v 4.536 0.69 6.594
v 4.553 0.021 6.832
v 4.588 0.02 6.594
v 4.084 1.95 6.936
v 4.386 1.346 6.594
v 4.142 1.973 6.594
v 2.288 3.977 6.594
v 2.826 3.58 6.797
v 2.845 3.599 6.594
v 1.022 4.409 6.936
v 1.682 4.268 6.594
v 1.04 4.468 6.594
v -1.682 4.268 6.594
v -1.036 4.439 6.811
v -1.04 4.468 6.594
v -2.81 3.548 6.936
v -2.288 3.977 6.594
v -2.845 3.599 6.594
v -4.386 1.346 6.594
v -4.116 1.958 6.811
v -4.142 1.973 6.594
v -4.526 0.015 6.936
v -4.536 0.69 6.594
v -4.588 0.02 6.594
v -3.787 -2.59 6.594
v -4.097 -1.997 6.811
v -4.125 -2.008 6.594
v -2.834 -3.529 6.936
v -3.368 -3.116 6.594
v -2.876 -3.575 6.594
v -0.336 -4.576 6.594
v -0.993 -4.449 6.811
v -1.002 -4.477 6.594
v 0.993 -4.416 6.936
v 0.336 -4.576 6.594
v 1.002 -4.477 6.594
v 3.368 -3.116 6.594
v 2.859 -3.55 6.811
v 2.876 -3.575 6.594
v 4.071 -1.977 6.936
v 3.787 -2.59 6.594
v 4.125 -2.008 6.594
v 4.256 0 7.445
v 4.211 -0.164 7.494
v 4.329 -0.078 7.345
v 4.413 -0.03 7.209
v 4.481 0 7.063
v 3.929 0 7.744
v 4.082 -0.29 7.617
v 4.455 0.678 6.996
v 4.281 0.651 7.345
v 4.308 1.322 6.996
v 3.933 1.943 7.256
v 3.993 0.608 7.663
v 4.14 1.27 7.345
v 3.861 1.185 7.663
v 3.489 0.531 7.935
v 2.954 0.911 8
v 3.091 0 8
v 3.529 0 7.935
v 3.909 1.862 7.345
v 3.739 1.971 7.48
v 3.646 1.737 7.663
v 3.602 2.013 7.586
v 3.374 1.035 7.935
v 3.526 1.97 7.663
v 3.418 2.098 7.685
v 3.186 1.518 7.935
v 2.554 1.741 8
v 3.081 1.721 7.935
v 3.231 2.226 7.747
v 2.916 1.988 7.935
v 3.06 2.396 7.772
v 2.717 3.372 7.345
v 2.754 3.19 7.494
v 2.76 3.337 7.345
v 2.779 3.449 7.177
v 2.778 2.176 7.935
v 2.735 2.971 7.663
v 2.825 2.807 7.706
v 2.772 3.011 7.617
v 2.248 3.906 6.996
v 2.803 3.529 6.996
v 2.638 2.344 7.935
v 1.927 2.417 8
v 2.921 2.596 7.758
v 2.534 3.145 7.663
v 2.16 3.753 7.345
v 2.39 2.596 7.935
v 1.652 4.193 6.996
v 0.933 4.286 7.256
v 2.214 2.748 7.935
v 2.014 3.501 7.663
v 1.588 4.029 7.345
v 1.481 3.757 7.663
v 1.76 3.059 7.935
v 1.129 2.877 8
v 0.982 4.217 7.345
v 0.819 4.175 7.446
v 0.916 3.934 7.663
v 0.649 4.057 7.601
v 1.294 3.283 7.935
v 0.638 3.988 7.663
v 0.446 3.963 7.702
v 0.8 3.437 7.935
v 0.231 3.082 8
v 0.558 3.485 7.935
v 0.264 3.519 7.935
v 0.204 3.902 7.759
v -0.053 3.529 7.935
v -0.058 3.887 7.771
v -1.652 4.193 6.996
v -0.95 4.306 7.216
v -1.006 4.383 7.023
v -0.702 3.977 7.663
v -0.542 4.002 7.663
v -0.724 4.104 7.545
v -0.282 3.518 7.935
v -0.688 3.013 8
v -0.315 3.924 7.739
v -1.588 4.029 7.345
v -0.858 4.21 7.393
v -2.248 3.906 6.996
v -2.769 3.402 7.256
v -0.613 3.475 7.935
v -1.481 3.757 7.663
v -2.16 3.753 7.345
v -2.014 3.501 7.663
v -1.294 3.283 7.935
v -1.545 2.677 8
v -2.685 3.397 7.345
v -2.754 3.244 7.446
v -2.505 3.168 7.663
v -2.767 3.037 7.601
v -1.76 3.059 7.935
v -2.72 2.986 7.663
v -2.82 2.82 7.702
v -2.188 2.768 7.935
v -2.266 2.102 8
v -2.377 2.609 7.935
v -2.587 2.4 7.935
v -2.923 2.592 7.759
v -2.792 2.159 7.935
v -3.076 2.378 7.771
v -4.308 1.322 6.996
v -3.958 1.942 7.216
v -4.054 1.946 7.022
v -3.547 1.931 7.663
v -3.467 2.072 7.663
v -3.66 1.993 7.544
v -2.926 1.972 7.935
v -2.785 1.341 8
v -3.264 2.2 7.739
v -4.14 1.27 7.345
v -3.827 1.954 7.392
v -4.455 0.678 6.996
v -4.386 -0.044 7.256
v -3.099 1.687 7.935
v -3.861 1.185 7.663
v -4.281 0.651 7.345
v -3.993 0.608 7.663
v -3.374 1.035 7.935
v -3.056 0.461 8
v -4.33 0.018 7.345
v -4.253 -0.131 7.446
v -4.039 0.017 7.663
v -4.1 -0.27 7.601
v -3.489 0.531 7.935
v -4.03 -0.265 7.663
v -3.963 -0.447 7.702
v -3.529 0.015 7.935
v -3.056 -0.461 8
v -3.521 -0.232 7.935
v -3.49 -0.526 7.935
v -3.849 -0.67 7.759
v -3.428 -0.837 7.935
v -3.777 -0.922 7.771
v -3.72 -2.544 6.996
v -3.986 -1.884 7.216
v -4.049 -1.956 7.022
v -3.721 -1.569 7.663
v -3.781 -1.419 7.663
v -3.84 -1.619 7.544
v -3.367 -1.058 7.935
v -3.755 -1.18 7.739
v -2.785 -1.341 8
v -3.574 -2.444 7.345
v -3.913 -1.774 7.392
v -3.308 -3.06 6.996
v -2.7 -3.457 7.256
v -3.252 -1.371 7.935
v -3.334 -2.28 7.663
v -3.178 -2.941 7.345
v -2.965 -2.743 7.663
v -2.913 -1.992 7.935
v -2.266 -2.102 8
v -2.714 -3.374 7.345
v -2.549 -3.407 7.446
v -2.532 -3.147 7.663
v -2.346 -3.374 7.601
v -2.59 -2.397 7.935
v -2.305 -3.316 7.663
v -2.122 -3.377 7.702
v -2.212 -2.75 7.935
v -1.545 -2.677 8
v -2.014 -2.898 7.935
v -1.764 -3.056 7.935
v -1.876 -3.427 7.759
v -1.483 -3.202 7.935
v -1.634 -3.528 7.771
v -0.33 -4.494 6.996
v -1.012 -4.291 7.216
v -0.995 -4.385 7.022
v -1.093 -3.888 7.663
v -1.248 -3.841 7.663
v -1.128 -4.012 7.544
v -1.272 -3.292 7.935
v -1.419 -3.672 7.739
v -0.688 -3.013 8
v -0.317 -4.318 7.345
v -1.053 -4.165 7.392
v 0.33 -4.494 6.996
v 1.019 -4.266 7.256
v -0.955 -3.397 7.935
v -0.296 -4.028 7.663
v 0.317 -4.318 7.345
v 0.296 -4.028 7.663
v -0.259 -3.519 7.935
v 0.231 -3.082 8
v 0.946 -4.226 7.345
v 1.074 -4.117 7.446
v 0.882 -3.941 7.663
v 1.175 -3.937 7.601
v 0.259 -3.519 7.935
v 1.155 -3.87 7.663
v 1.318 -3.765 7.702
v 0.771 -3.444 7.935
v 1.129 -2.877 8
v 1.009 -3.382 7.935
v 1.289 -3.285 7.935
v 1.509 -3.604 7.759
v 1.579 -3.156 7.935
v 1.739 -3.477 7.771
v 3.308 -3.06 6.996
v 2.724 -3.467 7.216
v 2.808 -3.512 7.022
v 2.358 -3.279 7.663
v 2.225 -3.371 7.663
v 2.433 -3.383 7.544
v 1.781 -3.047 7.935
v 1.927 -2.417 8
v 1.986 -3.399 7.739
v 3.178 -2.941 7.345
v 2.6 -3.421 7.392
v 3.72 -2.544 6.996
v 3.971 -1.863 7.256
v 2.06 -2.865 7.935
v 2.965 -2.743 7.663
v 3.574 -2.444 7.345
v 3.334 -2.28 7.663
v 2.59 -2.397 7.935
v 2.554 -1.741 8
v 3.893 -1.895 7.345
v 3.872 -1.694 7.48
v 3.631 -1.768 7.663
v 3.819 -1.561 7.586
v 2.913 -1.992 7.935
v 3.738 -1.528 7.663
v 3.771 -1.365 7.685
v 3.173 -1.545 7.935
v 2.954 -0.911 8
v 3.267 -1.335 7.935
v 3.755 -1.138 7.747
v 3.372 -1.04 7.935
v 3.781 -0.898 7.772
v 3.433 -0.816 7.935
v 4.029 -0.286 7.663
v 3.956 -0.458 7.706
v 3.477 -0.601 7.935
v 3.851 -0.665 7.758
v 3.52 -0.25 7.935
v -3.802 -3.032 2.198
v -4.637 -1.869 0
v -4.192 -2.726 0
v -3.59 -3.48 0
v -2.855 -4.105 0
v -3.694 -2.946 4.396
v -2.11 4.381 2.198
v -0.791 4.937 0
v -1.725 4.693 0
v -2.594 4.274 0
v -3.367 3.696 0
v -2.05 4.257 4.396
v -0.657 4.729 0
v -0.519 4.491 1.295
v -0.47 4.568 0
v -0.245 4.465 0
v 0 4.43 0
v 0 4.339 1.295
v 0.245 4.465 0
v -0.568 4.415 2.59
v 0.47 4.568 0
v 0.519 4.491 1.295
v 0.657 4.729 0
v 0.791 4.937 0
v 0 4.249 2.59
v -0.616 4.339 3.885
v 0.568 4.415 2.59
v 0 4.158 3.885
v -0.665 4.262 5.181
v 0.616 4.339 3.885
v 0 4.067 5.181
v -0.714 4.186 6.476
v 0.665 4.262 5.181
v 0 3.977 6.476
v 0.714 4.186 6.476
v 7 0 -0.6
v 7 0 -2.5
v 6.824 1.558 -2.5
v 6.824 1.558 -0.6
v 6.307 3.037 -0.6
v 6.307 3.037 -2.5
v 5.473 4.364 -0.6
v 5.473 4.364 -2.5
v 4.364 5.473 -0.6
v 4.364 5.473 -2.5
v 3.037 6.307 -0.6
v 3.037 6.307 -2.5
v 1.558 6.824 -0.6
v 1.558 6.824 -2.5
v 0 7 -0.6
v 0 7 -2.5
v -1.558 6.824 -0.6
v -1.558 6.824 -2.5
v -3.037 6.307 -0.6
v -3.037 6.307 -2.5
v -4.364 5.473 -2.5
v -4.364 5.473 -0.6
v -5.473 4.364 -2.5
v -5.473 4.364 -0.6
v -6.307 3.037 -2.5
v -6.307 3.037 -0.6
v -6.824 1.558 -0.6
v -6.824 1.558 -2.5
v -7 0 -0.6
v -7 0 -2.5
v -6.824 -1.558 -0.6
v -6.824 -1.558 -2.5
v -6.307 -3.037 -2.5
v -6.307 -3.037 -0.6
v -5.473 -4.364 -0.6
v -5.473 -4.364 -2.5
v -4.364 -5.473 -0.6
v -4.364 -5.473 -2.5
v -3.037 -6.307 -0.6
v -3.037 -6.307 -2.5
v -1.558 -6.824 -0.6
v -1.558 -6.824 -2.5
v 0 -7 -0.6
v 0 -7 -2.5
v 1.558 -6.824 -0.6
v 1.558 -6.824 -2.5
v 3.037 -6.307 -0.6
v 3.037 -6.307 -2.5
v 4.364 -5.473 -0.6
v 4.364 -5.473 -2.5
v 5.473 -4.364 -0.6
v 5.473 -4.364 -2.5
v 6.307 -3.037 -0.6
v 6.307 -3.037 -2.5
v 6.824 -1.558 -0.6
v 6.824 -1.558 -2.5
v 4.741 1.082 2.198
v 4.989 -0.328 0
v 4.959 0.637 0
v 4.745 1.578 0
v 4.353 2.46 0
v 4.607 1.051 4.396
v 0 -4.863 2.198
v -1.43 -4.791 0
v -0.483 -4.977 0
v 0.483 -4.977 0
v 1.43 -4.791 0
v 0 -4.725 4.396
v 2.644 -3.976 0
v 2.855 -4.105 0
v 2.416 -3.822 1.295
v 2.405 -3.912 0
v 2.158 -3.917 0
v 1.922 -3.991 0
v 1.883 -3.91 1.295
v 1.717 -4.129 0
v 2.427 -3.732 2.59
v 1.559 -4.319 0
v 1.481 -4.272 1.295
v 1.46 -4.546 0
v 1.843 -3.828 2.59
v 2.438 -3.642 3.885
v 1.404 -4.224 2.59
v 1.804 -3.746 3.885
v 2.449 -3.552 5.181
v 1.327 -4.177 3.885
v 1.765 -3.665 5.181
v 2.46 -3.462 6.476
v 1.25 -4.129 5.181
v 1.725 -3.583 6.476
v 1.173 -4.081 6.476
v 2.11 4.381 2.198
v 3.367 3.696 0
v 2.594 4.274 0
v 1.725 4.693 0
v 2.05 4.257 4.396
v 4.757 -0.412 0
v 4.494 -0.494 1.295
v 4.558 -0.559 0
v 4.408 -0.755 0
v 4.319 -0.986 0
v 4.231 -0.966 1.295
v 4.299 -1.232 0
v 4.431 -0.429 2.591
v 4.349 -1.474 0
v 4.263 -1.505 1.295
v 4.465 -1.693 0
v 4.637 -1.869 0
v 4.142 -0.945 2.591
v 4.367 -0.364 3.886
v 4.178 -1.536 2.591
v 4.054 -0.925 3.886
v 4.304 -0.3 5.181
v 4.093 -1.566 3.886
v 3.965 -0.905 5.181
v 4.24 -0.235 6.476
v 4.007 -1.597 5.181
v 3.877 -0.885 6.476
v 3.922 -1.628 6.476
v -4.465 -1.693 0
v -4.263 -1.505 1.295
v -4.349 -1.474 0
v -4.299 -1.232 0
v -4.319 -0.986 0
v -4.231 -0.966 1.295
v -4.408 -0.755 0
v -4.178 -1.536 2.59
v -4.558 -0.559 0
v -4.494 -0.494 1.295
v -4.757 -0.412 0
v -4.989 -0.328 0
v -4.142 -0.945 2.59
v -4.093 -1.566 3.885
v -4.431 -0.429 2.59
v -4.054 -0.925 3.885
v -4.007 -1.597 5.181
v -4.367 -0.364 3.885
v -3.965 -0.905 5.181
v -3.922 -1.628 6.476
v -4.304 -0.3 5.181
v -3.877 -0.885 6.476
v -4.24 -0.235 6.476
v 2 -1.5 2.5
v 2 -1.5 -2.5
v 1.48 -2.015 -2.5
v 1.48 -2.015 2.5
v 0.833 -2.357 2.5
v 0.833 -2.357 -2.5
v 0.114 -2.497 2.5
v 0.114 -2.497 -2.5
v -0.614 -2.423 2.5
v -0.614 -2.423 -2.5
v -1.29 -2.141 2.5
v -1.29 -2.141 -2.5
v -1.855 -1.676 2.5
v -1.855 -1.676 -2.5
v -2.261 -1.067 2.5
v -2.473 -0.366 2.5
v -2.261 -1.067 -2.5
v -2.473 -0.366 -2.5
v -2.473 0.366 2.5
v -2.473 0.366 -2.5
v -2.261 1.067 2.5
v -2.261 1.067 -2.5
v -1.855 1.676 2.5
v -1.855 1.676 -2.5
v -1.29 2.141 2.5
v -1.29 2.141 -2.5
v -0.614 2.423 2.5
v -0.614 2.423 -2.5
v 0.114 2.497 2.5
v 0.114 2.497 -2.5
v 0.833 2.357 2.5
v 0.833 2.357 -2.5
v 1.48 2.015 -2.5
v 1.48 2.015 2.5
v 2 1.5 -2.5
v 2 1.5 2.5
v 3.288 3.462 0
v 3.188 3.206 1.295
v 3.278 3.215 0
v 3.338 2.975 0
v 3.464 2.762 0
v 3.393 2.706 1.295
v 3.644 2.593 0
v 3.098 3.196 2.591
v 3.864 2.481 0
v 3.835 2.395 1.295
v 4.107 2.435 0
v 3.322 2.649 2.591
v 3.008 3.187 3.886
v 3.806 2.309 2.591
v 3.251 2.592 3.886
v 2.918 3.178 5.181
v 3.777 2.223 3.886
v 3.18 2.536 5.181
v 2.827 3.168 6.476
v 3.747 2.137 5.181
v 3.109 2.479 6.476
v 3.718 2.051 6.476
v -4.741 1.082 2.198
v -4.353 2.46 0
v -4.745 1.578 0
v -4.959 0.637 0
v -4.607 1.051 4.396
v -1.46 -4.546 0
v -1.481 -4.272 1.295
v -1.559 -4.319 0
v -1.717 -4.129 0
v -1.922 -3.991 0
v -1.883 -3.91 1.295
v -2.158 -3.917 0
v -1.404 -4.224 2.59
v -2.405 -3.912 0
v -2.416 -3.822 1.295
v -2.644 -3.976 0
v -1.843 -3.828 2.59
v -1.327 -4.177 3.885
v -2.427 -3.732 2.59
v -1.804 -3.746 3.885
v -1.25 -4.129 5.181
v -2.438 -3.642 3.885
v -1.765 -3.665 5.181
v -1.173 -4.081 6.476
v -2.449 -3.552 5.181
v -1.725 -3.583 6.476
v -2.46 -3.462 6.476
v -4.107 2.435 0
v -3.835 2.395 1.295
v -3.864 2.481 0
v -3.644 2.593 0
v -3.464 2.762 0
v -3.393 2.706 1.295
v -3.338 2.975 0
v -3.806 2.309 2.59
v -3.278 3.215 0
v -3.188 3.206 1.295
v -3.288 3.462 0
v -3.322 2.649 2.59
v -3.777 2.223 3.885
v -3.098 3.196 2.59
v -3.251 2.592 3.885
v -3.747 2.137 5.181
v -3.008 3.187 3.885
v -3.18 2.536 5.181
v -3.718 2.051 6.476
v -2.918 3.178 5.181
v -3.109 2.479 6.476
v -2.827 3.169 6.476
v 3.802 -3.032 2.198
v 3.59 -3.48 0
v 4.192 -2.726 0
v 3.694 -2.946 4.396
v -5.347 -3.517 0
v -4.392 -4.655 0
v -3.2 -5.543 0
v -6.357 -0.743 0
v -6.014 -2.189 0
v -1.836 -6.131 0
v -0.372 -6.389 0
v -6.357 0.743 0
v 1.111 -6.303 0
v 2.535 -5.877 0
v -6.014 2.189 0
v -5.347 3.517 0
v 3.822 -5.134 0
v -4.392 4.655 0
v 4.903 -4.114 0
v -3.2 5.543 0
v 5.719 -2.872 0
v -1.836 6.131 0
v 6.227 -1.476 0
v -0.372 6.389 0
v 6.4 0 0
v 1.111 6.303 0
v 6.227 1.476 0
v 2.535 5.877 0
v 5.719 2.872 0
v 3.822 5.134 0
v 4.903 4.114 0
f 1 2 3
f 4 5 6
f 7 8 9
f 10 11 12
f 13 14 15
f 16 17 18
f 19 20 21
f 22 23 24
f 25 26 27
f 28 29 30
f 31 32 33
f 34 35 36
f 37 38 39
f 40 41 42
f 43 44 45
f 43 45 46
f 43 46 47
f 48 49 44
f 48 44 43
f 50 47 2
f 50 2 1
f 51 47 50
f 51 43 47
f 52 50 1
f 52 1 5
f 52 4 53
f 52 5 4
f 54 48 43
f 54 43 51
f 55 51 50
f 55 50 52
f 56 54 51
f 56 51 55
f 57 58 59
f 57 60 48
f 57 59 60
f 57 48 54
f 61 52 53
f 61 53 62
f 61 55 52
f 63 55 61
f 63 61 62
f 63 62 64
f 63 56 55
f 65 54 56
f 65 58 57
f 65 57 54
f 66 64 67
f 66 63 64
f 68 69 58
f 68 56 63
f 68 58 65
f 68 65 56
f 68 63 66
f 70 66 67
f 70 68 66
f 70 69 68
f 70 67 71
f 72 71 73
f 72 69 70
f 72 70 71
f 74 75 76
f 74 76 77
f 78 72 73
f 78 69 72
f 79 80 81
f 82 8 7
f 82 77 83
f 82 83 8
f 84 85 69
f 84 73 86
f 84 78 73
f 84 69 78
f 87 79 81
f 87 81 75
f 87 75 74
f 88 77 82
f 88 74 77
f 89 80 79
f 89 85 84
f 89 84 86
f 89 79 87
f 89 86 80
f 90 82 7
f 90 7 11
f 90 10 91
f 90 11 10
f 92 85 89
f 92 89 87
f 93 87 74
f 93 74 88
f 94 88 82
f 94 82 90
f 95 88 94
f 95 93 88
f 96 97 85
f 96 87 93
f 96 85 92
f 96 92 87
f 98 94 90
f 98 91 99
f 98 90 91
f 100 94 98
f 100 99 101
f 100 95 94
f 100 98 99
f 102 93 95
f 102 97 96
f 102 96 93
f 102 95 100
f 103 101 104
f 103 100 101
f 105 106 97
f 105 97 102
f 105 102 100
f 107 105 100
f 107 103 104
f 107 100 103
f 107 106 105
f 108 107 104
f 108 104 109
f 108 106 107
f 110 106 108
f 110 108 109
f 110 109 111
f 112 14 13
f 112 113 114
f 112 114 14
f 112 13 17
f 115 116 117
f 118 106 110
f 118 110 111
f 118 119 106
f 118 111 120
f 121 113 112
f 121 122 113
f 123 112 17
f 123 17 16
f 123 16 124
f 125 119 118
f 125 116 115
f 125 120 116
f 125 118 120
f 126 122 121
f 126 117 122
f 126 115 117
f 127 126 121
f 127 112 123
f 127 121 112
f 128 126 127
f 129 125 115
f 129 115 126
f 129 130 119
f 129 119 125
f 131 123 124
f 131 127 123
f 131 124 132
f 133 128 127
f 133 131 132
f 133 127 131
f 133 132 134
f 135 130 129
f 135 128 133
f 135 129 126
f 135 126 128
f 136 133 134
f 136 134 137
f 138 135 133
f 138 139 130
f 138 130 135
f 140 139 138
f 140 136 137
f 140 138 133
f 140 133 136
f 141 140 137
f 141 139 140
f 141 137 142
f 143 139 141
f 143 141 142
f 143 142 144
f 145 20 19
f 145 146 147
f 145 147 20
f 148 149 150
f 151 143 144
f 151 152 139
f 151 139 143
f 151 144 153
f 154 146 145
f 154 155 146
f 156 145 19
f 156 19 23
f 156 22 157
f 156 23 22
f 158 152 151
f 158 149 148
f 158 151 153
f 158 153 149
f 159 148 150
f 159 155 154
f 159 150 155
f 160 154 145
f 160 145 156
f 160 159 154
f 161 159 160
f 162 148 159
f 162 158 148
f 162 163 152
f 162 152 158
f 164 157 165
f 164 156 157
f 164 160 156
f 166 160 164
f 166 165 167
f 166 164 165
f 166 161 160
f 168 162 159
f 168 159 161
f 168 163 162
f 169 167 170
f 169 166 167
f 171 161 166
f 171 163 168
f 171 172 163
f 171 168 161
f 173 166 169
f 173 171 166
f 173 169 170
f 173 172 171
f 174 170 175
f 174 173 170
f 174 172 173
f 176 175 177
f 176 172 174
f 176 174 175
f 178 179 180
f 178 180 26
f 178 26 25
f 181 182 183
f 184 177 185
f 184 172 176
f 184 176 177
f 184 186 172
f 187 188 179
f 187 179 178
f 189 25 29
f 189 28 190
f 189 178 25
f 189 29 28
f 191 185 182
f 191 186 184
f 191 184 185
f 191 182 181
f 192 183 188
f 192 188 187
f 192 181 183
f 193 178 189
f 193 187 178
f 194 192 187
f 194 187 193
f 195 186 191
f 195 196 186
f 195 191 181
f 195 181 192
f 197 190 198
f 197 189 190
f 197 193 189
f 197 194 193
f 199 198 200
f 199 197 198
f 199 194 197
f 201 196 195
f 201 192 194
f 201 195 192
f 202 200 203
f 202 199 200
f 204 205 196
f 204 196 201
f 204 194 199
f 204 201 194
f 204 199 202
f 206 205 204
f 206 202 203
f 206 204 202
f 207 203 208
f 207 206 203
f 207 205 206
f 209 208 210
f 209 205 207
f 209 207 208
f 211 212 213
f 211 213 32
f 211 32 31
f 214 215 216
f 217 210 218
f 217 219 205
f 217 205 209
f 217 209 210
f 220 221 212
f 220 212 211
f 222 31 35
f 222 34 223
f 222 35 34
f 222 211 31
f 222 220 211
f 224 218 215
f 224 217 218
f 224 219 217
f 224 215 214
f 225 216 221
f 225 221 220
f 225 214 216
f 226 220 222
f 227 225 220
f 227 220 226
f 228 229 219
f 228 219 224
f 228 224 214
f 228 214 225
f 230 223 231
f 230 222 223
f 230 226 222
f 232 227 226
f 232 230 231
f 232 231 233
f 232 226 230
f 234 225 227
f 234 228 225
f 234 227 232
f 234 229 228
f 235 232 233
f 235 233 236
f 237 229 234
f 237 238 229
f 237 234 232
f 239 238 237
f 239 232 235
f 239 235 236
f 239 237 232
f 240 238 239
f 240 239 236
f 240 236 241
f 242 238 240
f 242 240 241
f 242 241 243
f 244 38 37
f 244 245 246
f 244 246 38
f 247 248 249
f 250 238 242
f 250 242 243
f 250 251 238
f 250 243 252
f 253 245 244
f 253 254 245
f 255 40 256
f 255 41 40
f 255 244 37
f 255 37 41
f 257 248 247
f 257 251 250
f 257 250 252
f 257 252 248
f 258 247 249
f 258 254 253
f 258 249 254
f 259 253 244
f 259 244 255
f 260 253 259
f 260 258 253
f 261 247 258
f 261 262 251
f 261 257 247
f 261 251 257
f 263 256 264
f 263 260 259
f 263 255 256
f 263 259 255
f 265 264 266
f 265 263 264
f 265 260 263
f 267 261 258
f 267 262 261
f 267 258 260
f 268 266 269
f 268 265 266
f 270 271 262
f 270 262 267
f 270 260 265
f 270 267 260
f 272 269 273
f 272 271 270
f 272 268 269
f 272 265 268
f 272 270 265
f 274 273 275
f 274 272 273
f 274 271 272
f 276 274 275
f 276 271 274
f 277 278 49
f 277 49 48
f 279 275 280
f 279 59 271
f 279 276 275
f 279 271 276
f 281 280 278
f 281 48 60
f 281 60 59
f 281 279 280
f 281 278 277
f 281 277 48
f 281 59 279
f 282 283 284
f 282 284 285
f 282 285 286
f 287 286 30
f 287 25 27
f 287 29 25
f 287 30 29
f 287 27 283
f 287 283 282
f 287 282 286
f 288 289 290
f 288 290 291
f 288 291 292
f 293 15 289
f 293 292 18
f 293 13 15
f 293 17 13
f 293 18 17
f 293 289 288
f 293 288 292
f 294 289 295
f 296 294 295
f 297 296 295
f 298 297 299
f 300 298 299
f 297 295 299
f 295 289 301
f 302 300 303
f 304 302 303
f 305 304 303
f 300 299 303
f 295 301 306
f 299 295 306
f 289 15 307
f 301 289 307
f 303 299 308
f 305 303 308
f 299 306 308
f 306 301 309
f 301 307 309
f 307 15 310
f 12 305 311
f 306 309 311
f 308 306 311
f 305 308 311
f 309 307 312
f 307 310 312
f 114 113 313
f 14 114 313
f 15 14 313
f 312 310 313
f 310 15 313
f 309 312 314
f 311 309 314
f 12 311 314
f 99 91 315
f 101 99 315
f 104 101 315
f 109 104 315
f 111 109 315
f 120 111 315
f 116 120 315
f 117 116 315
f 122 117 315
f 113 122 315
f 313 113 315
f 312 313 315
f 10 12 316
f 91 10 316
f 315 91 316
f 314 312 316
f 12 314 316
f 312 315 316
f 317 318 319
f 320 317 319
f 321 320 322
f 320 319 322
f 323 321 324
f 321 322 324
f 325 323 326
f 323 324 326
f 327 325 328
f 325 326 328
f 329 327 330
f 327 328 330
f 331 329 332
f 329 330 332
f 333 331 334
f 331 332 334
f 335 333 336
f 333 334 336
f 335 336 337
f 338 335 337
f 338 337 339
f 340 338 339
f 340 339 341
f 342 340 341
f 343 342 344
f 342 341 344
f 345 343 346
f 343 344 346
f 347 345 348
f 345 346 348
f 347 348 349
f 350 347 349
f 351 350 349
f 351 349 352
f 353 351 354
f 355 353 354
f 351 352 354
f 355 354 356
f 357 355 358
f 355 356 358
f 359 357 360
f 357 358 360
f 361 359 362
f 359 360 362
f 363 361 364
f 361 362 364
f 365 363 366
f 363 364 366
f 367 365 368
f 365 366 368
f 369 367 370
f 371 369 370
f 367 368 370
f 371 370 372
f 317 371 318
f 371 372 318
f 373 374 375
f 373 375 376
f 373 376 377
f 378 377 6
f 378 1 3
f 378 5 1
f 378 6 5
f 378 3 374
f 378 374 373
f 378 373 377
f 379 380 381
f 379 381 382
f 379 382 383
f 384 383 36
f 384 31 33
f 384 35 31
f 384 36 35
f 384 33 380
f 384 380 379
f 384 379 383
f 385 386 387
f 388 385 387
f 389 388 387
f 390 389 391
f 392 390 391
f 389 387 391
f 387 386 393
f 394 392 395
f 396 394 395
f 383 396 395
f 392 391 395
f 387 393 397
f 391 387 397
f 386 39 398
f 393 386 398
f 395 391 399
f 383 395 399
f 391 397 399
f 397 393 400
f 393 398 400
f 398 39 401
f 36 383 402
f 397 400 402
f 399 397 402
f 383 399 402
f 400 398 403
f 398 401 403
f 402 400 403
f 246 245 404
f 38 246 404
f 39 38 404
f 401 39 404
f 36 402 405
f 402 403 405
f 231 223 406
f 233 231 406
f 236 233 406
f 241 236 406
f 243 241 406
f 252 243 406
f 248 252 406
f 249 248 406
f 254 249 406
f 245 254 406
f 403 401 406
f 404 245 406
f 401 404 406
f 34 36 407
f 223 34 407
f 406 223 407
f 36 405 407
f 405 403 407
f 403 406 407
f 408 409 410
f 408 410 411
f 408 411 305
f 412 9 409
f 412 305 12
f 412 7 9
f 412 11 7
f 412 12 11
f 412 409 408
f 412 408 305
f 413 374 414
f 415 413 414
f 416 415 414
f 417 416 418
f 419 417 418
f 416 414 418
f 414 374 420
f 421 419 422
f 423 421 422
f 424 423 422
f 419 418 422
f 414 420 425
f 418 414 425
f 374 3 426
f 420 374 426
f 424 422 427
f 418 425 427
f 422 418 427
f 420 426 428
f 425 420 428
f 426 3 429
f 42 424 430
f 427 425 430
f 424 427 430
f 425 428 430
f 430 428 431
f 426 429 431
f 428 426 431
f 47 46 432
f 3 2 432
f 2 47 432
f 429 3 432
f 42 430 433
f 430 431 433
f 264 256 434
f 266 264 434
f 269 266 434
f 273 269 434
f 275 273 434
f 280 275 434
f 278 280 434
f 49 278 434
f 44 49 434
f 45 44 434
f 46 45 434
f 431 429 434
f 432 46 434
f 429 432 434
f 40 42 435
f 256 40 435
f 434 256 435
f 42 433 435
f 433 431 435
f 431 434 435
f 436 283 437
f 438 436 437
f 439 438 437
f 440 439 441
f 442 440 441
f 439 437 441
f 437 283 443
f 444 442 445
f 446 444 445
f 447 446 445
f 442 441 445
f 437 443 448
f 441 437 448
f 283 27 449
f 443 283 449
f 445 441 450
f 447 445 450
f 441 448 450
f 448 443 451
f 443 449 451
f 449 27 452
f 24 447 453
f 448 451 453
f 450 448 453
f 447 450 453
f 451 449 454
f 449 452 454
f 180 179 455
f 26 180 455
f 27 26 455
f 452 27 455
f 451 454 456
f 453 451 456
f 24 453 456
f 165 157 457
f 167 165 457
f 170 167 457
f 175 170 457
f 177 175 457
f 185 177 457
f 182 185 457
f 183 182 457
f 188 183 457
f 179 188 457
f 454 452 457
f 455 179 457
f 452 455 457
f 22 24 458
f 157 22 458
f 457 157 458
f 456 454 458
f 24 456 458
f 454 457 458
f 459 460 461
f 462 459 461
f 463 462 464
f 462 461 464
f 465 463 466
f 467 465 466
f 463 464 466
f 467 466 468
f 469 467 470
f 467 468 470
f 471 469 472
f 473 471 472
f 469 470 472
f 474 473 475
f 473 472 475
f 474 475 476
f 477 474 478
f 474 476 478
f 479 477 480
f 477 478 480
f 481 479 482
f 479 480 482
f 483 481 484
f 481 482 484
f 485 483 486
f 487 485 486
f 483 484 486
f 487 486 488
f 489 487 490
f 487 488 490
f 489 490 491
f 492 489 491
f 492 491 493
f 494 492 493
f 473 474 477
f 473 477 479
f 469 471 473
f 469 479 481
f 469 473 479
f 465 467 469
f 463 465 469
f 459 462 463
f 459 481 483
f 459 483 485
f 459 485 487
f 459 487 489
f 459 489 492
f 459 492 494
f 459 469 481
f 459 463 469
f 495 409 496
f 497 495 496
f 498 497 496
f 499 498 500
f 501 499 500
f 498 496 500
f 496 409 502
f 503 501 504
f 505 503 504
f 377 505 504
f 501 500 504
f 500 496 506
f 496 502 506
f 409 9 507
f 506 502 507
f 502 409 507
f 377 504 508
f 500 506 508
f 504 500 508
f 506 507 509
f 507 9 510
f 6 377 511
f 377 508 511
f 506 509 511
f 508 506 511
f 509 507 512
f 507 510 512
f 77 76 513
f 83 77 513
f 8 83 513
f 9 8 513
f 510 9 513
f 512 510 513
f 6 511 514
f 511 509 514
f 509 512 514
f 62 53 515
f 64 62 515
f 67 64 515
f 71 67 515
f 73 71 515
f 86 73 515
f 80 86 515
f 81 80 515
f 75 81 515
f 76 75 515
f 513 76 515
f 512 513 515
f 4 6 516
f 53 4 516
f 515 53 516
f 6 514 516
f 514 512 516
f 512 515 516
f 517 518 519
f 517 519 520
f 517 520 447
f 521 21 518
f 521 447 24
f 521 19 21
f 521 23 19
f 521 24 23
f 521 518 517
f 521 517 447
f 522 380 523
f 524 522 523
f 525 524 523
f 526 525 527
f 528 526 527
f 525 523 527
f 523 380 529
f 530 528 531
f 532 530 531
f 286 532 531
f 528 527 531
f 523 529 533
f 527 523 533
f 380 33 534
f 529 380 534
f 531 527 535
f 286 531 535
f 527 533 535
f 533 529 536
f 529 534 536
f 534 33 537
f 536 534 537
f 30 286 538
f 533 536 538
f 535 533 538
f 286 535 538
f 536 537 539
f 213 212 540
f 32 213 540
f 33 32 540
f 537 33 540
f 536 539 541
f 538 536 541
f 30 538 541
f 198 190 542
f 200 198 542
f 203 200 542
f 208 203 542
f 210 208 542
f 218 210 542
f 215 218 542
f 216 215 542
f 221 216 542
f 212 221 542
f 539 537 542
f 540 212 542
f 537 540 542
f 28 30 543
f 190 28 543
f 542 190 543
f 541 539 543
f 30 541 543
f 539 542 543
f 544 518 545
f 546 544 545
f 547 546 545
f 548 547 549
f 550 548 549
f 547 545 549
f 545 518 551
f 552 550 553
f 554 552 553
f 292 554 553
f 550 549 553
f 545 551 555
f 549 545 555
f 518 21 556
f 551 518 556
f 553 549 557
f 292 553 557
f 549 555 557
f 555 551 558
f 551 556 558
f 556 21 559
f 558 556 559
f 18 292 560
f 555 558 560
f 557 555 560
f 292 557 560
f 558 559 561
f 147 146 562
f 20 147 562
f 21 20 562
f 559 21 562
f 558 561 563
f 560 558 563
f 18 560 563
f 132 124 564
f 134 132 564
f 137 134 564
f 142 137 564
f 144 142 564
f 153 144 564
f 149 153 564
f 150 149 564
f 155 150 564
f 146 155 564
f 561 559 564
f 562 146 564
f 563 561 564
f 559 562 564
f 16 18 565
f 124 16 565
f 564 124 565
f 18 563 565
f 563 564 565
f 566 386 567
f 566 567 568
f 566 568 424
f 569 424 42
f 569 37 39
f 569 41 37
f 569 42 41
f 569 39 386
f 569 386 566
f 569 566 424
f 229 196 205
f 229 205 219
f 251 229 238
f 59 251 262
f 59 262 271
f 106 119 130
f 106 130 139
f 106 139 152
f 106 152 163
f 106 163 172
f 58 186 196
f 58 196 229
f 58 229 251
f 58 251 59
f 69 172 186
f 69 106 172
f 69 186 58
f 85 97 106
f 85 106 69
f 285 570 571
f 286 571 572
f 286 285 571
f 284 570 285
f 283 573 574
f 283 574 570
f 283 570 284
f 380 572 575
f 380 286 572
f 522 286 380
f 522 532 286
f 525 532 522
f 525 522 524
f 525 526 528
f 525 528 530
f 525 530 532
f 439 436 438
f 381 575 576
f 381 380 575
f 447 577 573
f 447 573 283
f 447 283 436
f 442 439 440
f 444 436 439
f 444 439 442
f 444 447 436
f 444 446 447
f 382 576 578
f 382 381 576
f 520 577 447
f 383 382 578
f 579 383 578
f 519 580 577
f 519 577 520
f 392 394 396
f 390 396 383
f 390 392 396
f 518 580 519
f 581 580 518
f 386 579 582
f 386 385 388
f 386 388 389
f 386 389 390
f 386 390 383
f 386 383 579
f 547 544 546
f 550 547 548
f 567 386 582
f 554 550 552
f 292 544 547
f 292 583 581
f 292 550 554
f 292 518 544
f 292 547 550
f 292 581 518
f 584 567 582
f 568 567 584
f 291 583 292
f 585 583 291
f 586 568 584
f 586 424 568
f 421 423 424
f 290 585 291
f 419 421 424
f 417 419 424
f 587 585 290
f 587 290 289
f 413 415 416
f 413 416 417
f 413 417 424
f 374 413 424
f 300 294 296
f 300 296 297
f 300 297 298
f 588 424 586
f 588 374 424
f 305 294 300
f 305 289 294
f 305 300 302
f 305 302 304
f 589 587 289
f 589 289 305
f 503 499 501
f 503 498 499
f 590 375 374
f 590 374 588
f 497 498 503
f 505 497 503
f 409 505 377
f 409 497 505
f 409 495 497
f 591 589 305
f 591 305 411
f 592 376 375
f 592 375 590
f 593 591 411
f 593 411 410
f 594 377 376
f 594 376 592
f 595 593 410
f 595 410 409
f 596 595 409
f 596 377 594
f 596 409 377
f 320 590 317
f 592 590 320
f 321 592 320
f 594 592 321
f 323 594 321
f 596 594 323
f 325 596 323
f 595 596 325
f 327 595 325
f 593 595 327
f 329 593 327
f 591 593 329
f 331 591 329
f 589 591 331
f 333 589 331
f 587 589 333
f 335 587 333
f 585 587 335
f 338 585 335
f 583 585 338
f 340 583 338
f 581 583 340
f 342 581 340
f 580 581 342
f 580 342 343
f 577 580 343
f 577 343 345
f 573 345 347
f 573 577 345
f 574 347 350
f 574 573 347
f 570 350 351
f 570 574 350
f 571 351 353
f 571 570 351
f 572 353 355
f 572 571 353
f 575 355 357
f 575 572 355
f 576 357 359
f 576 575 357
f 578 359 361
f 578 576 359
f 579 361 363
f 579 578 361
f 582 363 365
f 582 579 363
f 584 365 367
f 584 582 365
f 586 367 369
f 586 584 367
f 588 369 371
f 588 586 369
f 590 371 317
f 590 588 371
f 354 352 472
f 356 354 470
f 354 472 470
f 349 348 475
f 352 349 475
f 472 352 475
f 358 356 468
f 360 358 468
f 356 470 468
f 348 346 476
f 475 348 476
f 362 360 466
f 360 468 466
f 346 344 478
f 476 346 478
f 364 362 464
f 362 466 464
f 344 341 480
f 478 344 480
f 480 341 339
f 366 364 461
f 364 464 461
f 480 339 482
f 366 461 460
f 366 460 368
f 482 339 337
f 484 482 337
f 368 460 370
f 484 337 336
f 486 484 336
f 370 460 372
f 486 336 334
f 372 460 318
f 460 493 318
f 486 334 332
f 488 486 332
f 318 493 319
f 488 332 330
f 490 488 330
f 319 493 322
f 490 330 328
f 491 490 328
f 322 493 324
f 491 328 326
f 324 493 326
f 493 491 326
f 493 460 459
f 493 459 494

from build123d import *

# Parameters (mm, degrees)
CYLINDER_R     = 7
CYLINDER_DEPTH = 2.5
CHAMFER_SIZE   = 0.6
ARRAY_COUNT    = 7
FILLET_R       = 1.5
POCKET_DEPTH   = 5


with BuildPart() as chamfer_body:
    # Cylinder → Cylinder (new body)
    with BuildSketch(Plane.XY.offset(-2.5)):
        Circle(CYLINDER_R)
    extrude(amount=CYLINDER_DEPTH)

    # Chamfer
    chamfer_edges = [chamfer_body.edges().sort_by_distance(p)[0] for p in [
        (-7, 0, 0),
    ]]
    chamfer(chamfer_edges, length=CHAMFER_SIZE)


with BuildPart() as array:
    # Cone001 → Cone001 (revolve)
    with BuildSketch(Plane(origin=(0, 5.3, -1), x_dir=(1, 0, 0), z_dir=(0, -1, 0))):
        Polygon((0, 0), (0.8, 0), (1.5, 10), (0, 10), align=None)
    revolve(axis=Axis((0, 5.3, -1), (0, 0, 1)))

    # Array: Array ×7 about axis
    array_axis = Axis((0, 0, 0), (0, 0, 1))


with BuildPart() as array_1:
    add(array.part)
    for i in range(1, ARRAY_COUNT):
        add(array.part.rotate(array_axis, i * 360 / ARRAY_COUNT))


with BuildPart() as pocket:
    # Cone → Cone (revolve)
    with BuildSketch(Plane.XZ):
        Polygon((0, 0), (5, 0), (4.5, 8), (0, 8), align=None)
    revolve(axis=Axis((0, 0, 0), (0, 0, 1)))

    # Fillet
    fillet_edges = [pocket.edges().sort_by_distance(p)[0] for p in [
        (-4.5, 0, 8),
    ]]
    fillet(fillet_edges, radius=FILLET_R)

    # Cut: cut Array
    add(array_1.part, mode=Mode.SUBTRACT)

    # Fusion: union Chamfer body
    add(chamfer_body.part)

    # Sketch → Pocket (cut)
    with BuildSketch(Plane(origin=(0, 0, -2.5), x_dir=(1, 0, 0), z_dir=(0, 0, -1))):
        with BuildLine():
            ThreePointArc((2, 1.5), (-2.5, 0), (2, -1.5))
            Line((2, 1.5), (2, -1.5))
        make_face()
    extrude(amount=-POCKET_DEPTH, mode=Mode.SUBTRACT)


solid = pocket.part
